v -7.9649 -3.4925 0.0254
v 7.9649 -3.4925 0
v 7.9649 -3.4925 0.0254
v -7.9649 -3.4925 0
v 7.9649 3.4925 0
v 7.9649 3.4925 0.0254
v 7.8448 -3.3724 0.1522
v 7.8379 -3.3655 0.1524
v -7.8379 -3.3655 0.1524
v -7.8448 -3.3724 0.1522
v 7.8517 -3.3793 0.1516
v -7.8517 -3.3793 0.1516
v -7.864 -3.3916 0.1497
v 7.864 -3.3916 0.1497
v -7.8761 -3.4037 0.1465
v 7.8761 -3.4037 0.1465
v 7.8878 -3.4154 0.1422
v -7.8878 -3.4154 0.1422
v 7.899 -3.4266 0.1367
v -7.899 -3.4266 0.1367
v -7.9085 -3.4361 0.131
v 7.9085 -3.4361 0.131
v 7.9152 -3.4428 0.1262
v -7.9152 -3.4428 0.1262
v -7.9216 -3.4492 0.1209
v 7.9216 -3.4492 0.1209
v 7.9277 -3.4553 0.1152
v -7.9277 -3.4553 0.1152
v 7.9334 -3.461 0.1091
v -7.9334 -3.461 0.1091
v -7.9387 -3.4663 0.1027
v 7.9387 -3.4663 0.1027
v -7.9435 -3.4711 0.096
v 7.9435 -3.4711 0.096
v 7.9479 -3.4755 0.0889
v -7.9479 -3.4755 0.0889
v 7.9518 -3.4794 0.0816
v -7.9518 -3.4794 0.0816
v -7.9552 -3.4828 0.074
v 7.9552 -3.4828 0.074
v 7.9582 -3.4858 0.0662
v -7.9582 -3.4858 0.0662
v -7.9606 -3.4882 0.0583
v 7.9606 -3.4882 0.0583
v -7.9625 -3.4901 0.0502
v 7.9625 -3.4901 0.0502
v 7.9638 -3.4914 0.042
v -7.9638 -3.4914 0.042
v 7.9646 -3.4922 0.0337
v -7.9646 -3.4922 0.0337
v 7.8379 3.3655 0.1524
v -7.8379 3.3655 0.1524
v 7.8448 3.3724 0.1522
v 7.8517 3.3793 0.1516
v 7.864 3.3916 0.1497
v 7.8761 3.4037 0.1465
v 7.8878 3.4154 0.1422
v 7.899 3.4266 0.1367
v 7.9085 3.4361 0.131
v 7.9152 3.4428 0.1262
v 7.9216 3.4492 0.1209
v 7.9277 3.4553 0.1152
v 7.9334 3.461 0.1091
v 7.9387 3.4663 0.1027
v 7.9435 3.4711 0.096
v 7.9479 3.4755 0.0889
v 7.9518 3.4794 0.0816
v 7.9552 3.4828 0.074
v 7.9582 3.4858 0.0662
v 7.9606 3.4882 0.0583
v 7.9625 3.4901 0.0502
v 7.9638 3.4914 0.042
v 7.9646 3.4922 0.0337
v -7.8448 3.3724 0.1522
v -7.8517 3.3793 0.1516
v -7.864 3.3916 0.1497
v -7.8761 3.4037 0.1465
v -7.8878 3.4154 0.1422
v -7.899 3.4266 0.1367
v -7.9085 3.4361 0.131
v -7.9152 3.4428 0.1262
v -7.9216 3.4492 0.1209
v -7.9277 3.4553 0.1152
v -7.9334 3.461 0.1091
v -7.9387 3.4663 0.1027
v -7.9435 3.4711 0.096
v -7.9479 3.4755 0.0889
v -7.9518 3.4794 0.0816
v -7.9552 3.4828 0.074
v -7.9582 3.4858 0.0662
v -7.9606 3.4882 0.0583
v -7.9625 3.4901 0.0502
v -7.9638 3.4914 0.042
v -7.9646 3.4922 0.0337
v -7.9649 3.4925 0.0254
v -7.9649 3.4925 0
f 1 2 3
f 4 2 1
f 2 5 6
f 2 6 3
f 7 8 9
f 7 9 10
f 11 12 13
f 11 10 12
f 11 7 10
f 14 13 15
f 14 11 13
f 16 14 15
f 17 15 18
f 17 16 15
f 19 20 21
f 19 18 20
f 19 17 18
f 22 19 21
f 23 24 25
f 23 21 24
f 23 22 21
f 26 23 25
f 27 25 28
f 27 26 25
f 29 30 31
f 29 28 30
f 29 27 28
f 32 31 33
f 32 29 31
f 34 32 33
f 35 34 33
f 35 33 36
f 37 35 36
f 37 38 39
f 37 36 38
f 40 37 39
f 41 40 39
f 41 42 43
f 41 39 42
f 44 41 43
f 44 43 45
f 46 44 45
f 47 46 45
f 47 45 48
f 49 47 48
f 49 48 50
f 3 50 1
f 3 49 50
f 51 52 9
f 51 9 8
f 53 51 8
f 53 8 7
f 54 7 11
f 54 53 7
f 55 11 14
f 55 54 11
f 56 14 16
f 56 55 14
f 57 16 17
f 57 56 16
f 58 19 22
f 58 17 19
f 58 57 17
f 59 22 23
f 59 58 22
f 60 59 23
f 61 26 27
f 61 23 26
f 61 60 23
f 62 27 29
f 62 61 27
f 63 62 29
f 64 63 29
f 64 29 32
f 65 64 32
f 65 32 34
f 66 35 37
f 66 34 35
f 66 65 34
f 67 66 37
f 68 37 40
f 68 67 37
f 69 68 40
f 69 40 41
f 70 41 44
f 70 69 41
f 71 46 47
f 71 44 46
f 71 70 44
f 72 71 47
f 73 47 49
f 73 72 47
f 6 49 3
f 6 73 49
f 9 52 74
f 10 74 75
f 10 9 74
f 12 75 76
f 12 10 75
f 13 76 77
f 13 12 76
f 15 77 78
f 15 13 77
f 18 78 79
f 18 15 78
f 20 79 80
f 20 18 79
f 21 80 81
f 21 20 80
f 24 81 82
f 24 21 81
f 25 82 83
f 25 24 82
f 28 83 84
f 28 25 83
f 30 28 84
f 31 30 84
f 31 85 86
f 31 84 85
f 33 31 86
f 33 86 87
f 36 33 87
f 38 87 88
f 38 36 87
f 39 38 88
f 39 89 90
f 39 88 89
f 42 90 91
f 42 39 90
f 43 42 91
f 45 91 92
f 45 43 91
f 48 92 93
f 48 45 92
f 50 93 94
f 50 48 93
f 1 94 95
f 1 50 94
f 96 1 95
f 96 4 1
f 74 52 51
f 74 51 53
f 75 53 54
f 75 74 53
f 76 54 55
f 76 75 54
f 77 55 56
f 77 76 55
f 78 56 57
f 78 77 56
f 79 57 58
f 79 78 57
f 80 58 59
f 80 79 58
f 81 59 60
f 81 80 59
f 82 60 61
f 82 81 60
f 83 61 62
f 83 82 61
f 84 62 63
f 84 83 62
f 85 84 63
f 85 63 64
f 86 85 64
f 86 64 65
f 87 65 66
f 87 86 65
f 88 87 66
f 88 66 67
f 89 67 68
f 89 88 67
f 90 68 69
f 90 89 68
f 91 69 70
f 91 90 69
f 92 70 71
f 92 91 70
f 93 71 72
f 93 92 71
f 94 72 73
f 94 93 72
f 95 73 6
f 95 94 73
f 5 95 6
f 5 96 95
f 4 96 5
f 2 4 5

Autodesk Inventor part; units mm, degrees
ref_plane "YZ Plane" through (0, 0, 0) normal (1, 0, 0) x (0, 1, 0)
ref_plane "XZ Plane" through (0, 0, 0) normal (0, 1, 0) x (-1, 0, 0)
ref_plane "XY Plane" through (0, 0, 0) normal (0, 0, 1) x (1, 0, 0)
sketch "Sketch1" plane through (0, 0, 0) normal (0, 0, 1) x (1, 0, 0)
  line L0 (-7.9649, -3.4925) -> (-7.9649, 3.4925) projected
  line L1 (7.9649, -3.4925) -> (-7.9649, -3.4925) projected
  line L2 (7.9649, 3.4925) -> (7.9649, -3.4925) projected
  line L3 (-7.9649, 3.4925) -> (7.9649, 3.4925) projected
  point P0 (0, 0)
extrude "Extrusion1" add sketch "Sketch1" along normal blind 0.0254
sketch "Sketch2" plane through (0, 0, 0.0254) normal (0, 0, 1) x (1, 0, 0)
  line L0 (-7.9649, 3.4925) -> (-7.9649, -3.4925) projected
  line L1 (-7.9649, -3.4925) -> (7.9649, -3.4925) projected
  line L2 (7.9649, -3.4925) -> (7.9649, 3.4925) projected
  line L3 (7.9649, 3.4925) -> (-7.9649, 3.4925) projected
  point P0 (0, 0)
extrude "Extrusion2" add sketch "Sketch2" along normal blind 0.127
fillet "Fillet1" radius 0.127 4 edges at (0, 3.4925, 0.1524) (7.9649, 0, 0.1524) (0, -3.4925, 0.1524) (-7.9649, 0, 0.1524)
sketch "Sketch3" plane through (0, 0, 0.1524) normal (0, 0, 1) x (1, 0, 0)
  line L0 (-7.9649, 3.4925) -> (7.9649, 3.4925) projected
  line L1 (-7.9649, 3.4925) -> (8.0371, 3.4925) construction
  line L2 (8.0371, 3.4925) -> (8.0371, -3.4925) construction
  line L3 (8.0371, -3.4925) -> (-7.9649, -3.4925) construction
  line L4 (-7.9649, -3.4925) -> (-7.9649, 3.4925) construction
  point P0 (0, 0)
decal "Decal1"
properties part number "Emblem" material "Aluminum 6061-AHC"
